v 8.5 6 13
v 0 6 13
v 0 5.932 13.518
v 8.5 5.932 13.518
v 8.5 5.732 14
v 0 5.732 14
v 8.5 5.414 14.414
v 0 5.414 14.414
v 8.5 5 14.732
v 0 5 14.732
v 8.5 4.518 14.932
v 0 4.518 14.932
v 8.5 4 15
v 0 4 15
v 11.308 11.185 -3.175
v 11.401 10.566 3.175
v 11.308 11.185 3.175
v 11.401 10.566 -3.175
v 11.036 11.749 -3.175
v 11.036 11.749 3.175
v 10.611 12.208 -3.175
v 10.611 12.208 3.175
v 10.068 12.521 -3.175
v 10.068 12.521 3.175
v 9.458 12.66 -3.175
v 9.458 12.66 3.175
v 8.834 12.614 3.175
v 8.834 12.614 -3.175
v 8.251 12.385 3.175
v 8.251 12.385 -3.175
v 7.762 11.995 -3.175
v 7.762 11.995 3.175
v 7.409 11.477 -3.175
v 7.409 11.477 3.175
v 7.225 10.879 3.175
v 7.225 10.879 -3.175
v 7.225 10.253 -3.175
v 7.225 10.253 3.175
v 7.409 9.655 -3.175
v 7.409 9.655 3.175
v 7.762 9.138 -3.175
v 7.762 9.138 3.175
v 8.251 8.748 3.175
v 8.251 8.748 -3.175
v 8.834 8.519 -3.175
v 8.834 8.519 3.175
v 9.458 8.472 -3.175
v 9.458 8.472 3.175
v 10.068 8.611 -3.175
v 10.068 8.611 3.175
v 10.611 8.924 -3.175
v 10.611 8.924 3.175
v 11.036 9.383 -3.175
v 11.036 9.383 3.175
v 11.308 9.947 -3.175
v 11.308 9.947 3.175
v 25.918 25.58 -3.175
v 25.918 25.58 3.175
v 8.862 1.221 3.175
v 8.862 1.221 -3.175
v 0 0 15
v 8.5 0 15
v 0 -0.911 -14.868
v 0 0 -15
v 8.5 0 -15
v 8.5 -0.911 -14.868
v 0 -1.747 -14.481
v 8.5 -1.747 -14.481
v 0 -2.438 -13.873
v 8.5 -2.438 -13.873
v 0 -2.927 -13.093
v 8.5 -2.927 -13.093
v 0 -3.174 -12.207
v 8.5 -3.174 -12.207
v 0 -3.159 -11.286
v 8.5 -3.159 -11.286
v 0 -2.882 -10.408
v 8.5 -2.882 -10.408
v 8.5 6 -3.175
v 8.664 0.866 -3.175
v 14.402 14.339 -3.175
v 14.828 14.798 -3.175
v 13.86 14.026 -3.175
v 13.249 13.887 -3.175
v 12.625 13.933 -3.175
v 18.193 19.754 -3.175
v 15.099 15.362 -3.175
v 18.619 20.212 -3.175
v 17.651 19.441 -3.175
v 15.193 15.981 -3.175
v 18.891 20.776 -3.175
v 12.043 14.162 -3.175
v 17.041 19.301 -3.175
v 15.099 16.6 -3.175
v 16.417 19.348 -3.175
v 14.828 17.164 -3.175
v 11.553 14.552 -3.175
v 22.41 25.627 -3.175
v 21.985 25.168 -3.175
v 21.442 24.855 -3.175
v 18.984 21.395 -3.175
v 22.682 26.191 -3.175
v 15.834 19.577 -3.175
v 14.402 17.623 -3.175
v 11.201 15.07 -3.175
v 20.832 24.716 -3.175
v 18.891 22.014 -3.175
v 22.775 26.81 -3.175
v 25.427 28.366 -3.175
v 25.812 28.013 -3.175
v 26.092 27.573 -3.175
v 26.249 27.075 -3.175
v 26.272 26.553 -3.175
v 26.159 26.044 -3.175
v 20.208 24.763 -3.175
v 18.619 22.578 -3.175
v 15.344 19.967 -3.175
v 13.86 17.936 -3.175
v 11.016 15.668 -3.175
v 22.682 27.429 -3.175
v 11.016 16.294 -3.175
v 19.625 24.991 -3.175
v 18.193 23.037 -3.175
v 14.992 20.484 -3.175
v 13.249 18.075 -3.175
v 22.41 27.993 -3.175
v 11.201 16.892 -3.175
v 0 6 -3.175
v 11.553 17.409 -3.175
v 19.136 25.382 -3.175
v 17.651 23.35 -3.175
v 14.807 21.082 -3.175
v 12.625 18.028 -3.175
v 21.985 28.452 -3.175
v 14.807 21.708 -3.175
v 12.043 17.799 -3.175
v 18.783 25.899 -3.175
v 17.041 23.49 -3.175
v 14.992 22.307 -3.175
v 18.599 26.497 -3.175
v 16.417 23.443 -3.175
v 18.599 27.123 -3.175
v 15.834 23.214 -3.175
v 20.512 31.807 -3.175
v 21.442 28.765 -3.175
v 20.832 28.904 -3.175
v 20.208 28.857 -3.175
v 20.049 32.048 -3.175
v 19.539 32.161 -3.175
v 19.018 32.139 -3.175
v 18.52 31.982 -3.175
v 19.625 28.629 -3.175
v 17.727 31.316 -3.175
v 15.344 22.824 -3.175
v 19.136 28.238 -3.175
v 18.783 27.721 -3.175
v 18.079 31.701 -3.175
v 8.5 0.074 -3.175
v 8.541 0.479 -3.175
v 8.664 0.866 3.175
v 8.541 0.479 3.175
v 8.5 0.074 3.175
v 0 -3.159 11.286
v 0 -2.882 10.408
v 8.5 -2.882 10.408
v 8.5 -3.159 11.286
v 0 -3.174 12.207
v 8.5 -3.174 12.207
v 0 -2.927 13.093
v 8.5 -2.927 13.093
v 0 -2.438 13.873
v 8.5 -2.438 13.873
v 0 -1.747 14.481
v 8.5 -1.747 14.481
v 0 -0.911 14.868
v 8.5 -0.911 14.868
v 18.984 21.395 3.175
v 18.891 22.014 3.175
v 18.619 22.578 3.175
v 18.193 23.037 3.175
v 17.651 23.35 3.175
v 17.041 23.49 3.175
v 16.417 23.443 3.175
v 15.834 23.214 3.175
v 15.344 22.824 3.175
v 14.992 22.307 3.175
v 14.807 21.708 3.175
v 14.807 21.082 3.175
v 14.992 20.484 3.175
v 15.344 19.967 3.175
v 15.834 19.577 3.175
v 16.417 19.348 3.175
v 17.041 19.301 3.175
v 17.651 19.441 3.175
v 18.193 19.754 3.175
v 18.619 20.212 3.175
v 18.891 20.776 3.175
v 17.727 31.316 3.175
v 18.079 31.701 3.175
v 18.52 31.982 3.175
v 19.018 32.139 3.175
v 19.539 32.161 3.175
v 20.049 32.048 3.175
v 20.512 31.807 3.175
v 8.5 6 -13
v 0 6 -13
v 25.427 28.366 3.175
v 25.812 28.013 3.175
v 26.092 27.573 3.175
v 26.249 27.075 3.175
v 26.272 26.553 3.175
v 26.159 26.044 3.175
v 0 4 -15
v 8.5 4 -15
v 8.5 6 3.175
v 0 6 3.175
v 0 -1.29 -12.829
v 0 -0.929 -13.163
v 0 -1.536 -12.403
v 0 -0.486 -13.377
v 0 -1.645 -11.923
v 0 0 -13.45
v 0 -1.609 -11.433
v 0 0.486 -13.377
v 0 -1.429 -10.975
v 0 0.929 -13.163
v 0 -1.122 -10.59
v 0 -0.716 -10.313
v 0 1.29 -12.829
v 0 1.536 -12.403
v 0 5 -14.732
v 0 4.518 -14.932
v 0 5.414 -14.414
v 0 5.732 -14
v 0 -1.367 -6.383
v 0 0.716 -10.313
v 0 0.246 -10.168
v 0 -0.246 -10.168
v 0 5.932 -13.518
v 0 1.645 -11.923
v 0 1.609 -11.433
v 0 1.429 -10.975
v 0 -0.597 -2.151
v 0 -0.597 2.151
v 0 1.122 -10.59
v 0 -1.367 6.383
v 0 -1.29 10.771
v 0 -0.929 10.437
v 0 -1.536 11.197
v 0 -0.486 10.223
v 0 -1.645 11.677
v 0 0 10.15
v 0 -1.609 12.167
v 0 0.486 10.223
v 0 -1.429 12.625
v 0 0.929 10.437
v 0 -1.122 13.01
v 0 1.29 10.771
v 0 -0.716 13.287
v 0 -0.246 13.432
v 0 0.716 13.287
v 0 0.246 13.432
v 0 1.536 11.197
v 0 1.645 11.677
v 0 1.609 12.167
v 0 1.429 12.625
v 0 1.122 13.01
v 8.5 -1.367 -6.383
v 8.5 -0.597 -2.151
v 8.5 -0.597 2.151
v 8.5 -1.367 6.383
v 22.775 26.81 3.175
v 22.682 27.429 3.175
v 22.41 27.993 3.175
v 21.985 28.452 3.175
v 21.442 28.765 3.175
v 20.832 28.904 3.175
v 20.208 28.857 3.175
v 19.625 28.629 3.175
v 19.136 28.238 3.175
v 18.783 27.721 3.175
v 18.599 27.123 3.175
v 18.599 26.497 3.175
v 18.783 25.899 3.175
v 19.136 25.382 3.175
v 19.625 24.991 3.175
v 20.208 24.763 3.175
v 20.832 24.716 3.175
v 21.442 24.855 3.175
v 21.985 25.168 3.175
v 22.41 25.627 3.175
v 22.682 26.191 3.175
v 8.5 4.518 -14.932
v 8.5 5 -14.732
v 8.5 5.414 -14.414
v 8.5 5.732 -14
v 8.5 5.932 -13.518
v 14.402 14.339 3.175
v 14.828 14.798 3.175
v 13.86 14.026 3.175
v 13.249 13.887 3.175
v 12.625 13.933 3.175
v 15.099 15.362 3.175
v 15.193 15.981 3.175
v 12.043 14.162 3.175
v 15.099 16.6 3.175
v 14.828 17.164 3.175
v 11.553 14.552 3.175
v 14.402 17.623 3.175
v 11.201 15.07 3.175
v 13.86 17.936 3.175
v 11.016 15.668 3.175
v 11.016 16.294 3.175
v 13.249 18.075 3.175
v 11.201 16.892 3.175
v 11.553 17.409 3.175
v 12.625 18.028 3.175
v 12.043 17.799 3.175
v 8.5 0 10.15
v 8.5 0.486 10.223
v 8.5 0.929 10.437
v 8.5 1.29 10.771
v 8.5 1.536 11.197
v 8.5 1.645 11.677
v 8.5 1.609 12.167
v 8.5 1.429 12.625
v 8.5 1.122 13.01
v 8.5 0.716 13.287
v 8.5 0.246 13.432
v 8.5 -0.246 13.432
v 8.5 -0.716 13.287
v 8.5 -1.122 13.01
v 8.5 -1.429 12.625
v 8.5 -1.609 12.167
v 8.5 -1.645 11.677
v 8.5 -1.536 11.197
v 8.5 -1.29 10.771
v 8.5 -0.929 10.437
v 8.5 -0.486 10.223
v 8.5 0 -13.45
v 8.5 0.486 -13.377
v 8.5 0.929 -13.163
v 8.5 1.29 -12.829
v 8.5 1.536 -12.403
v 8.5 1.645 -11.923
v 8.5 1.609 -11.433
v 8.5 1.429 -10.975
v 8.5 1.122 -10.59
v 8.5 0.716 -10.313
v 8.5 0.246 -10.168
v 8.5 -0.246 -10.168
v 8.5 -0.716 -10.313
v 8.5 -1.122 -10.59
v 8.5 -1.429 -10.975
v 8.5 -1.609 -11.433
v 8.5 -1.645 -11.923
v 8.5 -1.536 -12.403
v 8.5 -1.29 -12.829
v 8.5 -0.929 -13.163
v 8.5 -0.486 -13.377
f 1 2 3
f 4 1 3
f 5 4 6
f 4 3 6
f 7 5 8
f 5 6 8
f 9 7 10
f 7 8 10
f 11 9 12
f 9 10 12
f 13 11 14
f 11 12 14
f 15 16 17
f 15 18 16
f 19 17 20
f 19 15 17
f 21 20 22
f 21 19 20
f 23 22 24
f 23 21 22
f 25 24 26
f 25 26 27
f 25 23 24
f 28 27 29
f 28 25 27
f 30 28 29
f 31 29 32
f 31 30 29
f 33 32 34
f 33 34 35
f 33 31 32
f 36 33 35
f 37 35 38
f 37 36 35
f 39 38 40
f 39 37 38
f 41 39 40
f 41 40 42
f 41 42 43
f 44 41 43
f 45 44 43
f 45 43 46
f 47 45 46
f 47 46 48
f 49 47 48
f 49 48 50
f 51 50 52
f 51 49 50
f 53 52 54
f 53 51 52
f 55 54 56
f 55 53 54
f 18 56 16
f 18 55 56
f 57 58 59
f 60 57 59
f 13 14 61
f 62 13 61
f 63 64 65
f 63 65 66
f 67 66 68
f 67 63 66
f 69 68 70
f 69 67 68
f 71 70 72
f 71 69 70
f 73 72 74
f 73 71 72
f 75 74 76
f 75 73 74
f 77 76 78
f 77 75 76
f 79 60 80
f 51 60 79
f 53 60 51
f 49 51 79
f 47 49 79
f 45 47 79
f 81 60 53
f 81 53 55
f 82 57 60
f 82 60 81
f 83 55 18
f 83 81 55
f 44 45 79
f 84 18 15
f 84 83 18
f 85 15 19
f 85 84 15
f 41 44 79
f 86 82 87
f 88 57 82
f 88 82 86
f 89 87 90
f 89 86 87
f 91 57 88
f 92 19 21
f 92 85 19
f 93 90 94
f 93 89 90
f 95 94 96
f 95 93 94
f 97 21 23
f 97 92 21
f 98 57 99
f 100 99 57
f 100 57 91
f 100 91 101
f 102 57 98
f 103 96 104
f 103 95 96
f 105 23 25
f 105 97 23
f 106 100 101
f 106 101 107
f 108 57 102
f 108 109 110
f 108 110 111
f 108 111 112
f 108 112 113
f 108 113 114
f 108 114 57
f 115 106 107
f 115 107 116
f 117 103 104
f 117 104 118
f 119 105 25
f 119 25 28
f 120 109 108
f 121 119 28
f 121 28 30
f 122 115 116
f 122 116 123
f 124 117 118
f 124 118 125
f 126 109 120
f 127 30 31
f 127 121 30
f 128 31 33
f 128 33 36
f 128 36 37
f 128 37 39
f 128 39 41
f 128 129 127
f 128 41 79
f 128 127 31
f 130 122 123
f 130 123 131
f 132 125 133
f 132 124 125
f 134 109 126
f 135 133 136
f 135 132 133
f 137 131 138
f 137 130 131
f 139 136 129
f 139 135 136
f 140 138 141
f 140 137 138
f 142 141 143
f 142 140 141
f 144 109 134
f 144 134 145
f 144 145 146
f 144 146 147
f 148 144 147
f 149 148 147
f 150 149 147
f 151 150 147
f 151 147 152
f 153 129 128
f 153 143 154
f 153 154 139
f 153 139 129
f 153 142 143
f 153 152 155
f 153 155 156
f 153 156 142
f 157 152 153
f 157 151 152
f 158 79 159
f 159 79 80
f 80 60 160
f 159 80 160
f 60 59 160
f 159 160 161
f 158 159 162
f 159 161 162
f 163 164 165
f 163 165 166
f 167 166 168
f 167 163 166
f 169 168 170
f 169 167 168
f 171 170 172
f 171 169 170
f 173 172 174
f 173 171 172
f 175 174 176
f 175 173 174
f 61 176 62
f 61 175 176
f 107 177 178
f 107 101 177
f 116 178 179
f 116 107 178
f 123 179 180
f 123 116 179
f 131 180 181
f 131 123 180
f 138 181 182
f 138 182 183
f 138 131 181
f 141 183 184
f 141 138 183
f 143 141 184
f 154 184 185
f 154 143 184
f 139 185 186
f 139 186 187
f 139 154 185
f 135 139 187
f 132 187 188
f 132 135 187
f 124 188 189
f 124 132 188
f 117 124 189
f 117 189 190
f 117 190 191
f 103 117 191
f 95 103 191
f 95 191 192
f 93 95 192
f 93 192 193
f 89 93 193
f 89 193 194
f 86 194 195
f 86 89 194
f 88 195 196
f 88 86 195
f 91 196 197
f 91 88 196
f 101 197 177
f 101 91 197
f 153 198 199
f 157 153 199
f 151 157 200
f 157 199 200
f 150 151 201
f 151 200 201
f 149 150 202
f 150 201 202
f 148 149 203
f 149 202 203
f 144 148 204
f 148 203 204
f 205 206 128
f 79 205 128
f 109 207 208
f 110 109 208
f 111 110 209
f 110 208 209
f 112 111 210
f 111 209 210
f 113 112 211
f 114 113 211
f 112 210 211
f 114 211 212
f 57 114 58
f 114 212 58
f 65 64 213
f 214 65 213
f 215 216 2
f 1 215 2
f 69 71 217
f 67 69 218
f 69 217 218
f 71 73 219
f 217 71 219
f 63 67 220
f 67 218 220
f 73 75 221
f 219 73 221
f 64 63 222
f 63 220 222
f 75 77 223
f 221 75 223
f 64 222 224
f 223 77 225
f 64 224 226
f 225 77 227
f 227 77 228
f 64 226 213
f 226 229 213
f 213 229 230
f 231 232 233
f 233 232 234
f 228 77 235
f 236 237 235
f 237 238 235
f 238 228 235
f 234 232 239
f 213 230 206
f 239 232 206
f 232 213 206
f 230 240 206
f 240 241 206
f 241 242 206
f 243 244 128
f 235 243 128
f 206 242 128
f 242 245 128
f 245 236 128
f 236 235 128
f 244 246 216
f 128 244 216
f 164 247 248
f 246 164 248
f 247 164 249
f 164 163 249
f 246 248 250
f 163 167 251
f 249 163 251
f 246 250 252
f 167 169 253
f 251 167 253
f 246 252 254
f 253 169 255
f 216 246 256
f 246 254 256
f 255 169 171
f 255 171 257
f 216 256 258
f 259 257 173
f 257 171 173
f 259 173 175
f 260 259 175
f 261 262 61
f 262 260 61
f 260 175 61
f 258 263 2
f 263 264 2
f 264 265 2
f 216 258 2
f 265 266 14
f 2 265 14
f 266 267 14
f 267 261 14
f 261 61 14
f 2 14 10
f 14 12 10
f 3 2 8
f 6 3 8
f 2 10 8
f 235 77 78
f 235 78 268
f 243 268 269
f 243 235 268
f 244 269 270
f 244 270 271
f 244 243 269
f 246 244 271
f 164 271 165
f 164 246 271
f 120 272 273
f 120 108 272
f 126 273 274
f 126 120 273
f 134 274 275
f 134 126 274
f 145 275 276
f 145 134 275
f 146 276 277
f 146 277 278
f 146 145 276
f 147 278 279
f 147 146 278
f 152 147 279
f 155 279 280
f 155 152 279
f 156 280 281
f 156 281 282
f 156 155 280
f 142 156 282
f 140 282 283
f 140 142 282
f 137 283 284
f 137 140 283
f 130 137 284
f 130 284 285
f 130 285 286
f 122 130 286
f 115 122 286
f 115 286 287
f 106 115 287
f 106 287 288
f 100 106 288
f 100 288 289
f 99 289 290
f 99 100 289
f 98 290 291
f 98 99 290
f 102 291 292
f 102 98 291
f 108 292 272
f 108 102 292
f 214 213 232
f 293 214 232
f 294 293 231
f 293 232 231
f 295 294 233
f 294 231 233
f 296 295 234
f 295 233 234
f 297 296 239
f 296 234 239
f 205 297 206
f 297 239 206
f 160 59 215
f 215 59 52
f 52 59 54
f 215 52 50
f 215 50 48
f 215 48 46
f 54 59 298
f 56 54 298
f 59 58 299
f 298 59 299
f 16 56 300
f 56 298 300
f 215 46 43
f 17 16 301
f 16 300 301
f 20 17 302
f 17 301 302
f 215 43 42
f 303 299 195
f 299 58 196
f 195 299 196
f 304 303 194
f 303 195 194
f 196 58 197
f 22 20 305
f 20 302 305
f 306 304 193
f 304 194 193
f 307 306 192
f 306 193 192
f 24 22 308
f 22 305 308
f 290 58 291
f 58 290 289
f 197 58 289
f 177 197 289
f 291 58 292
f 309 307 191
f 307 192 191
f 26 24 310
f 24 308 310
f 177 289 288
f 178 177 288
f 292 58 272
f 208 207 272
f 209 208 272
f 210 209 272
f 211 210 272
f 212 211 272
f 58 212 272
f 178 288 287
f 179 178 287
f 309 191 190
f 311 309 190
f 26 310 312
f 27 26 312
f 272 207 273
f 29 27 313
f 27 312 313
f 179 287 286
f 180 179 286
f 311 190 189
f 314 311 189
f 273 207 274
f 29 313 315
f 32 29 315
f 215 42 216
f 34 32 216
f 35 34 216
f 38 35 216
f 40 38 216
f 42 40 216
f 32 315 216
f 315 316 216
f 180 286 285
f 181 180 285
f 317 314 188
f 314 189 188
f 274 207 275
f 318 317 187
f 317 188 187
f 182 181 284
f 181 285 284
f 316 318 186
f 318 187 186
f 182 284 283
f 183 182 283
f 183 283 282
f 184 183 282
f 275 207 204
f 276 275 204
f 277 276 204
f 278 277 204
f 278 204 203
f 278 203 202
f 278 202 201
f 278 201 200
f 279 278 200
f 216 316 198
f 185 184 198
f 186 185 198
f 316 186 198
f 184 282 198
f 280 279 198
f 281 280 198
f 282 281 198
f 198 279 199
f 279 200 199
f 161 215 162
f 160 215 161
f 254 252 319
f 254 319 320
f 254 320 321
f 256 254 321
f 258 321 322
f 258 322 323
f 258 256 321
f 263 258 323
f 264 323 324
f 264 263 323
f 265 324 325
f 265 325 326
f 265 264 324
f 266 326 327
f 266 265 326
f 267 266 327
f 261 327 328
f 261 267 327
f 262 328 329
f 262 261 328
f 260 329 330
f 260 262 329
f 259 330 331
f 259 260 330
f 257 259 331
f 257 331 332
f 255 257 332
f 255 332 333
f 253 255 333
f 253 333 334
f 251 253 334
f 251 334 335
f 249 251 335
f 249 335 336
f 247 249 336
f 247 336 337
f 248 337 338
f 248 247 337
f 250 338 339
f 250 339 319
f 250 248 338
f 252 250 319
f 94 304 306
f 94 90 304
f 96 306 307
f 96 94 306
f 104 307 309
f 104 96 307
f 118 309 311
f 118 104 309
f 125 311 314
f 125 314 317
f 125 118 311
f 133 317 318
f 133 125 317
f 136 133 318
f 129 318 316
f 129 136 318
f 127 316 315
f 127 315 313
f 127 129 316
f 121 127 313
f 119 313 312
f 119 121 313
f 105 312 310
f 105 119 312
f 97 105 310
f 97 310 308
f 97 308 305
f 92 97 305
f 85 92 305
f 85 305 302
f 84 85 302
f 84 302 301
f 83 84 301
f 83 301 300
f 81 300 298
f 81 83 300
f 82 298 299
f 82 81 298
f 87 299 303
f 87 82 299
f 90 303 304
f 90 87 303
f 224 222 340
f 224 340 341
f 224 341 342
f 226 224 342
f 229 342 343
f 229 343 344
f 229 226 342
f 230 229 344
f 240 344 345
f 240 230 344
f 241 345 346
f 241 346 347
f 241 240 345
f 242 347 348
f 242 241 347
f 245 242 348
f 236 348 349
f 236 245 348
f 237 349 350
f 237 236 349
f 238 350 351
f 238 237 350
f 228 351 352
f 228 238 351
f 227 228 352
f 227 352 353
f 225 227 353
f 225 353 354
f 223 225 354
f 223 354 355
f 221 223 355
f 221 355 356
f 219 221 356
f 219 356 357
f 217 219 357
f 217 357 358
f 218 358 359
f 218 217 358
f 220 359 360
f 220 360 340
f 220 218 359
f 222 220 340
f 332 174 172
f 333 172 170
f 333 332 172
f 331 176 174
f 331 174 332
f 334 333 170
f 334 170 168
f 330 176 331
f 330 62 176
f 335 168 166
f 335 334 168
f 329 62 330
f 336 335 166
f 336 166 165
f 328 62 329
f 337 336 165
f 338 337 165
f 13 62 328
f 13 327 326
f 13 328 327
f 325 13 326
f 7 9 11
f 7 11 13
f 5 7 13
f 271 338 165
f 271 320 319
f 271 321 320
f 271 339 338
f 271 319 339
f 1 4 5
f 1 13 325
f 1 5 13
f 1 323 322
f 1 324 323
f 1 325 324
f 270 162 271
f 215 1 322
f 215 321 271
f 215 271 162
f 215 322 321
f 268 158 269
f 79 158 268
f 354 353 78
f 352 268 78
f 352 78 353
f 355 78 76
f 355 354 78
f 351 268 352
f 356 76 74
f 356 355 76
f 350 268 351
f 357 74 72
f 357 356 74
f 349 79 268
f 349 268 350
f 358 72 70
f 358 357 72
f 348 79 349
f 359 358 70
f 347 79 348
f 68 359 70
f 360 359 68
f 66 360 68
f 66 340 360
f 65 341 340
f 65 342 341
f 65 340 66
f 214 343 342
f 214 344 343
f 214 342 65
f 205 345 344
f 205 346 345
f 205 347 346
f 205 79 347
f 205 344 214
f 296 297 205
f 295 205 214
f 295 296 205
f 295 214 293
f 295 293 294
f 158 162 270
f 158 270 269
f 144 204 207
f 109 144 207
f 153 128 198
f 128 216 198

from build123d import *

# Parameters (mm, degrees)
SKETCH1_R           = 1.65
BOSS_EXTRUDE1_DEPTH = 8.5
SKETCH2_R           = 2.1
BOSS_EXTRUDE2_DEPTH = 3.175
FILLET1_R           = 2
CUT_EXTRUDE1_START  = -10
CUT_EXTRUDE1_DEPTH  = 10


with BuildPart() as part:
    # Sketch1 → Boss-Extrude1 (new body)
    with BuildSketch(Plane(origin=(0, 0, 0), x_dir=(0, 0, -1), z_dir=(1, 0, 0))):
        with BuildLine():
            Line((-13, -6), (13, -6))
            ThreePointArc((13, -6), (14.414213562, -5.414213562), (15, -4))
            Line((15, -4), (15, 4))
            ThreePointArc((15, 4), (14.414213562, 5.414213562), (13, 6))
            Line((13, 6), (-13, 6))
            ThreePointArc((-13, 6), (-14.414213562, 5.414213562), (-15, 4))
            Line((-15, 4), (-15, -4))
            ThreePointArc((-15, -4), (-14.414213562, -5.414213562), (-13, -6))
        make_face()
        with Locations((-11.8, 0)):
            Circle(SKETCH1_R, mode=Mode.SUBTRACT)
        with Locations((11.8, 0)):
            Circle(SKETCH1_R, mode=Mode.SUBTRACT)
    extrude(amount=BOSS_EXTRUDE1_DEPTH)

    # Sketch2 → Boss-Extrude2 (add, symmetric)
    with BuildSketch(Plane.XY):
        with BuildLine():
            Line((25.918129472, 25.580456988), (3.805255429, -6))
            Line((3.805255429, -6), (0, -3.335531464))
            Line((0, -3.335531464), (0, 6))
            Line((0, 6), (17.726609029, 31.316221351))
            ThreePointArc((17.726609029, 31.316221351), (19.017616762, 32.138683985), (20.51206599, 31.807372567))
            Line((20.51206599, 31.807372567), (25.426978256, 28.365913949))
            ThreePointArc((25.426978256, 28.365913949), (26.249440889, 27.074906216), (25.918129472, 25.580456988))
        make_face()
        with Locations((20.675216378, 26.810035081)):
            Circle(SKETCH2_R, mode=Mode.SUBTRACT)
        with Locations((16.883876134, 21.395440068)):
            Circle(SKETCH2_R, mode=Mode.SUBTRACT)
        with Locations((13.092535889, 15.980845055)):
            Circle(SKETCH2_R, mode=Mode.SUBTRACT)
        with Locations((9.301195645, 10.566250043)):
            Circle(SKETCH2_R, mode=Mode.SUBTRACT)
    extrude(amount=BOSS_EXTRUDE2_DEPTH, both=True)

    # Fillet1
    fillet1_edges = [part.edges().sort_by_distance(p)[0] for p in [
        (8.5, 0.704790101, 0),
    ]]
    fillet(fillet1_edges, radius=FILLET1_R)

    # Sketch4 → Cut-Extrude1 (cut)
    with BuildSketch(Plane(origin=(8.5, 0, 0), x_dir=(0, 0, -1), z_dir=(1, 0, 0)).offset(CUT_EXTRUDE1_START)):
        with BuildLine():
            Line((-15, 0), (-15, -4))
            ThreePointArc((-15, -4), (-14.414213562, -5.414213562), (-13, -6))
            Line((-13, -6), (13, -6))
            ThreePointArc((13, -6), (14.414213562, -5.414213562), (15, -4))
            Line((15, -4), (15, 0))
            ThreePointArc((15, 0), (13.501034406, -2.710439438), (10.408448782, -2.881594213))
            ThreePointArc((10.408448782, -2.881594213), (0, -0.5), (-10.408448782, -2.881594213))
            ThreePointArc((-10.408448782, -2.881594213), (-13.501034406, -2.710439438), (-15, 0))
        make_face()
    extrude(amount=CUT_EXTRUDE1_DEPTH, mode=Mode.SUBTRACT)


solid = part.part
